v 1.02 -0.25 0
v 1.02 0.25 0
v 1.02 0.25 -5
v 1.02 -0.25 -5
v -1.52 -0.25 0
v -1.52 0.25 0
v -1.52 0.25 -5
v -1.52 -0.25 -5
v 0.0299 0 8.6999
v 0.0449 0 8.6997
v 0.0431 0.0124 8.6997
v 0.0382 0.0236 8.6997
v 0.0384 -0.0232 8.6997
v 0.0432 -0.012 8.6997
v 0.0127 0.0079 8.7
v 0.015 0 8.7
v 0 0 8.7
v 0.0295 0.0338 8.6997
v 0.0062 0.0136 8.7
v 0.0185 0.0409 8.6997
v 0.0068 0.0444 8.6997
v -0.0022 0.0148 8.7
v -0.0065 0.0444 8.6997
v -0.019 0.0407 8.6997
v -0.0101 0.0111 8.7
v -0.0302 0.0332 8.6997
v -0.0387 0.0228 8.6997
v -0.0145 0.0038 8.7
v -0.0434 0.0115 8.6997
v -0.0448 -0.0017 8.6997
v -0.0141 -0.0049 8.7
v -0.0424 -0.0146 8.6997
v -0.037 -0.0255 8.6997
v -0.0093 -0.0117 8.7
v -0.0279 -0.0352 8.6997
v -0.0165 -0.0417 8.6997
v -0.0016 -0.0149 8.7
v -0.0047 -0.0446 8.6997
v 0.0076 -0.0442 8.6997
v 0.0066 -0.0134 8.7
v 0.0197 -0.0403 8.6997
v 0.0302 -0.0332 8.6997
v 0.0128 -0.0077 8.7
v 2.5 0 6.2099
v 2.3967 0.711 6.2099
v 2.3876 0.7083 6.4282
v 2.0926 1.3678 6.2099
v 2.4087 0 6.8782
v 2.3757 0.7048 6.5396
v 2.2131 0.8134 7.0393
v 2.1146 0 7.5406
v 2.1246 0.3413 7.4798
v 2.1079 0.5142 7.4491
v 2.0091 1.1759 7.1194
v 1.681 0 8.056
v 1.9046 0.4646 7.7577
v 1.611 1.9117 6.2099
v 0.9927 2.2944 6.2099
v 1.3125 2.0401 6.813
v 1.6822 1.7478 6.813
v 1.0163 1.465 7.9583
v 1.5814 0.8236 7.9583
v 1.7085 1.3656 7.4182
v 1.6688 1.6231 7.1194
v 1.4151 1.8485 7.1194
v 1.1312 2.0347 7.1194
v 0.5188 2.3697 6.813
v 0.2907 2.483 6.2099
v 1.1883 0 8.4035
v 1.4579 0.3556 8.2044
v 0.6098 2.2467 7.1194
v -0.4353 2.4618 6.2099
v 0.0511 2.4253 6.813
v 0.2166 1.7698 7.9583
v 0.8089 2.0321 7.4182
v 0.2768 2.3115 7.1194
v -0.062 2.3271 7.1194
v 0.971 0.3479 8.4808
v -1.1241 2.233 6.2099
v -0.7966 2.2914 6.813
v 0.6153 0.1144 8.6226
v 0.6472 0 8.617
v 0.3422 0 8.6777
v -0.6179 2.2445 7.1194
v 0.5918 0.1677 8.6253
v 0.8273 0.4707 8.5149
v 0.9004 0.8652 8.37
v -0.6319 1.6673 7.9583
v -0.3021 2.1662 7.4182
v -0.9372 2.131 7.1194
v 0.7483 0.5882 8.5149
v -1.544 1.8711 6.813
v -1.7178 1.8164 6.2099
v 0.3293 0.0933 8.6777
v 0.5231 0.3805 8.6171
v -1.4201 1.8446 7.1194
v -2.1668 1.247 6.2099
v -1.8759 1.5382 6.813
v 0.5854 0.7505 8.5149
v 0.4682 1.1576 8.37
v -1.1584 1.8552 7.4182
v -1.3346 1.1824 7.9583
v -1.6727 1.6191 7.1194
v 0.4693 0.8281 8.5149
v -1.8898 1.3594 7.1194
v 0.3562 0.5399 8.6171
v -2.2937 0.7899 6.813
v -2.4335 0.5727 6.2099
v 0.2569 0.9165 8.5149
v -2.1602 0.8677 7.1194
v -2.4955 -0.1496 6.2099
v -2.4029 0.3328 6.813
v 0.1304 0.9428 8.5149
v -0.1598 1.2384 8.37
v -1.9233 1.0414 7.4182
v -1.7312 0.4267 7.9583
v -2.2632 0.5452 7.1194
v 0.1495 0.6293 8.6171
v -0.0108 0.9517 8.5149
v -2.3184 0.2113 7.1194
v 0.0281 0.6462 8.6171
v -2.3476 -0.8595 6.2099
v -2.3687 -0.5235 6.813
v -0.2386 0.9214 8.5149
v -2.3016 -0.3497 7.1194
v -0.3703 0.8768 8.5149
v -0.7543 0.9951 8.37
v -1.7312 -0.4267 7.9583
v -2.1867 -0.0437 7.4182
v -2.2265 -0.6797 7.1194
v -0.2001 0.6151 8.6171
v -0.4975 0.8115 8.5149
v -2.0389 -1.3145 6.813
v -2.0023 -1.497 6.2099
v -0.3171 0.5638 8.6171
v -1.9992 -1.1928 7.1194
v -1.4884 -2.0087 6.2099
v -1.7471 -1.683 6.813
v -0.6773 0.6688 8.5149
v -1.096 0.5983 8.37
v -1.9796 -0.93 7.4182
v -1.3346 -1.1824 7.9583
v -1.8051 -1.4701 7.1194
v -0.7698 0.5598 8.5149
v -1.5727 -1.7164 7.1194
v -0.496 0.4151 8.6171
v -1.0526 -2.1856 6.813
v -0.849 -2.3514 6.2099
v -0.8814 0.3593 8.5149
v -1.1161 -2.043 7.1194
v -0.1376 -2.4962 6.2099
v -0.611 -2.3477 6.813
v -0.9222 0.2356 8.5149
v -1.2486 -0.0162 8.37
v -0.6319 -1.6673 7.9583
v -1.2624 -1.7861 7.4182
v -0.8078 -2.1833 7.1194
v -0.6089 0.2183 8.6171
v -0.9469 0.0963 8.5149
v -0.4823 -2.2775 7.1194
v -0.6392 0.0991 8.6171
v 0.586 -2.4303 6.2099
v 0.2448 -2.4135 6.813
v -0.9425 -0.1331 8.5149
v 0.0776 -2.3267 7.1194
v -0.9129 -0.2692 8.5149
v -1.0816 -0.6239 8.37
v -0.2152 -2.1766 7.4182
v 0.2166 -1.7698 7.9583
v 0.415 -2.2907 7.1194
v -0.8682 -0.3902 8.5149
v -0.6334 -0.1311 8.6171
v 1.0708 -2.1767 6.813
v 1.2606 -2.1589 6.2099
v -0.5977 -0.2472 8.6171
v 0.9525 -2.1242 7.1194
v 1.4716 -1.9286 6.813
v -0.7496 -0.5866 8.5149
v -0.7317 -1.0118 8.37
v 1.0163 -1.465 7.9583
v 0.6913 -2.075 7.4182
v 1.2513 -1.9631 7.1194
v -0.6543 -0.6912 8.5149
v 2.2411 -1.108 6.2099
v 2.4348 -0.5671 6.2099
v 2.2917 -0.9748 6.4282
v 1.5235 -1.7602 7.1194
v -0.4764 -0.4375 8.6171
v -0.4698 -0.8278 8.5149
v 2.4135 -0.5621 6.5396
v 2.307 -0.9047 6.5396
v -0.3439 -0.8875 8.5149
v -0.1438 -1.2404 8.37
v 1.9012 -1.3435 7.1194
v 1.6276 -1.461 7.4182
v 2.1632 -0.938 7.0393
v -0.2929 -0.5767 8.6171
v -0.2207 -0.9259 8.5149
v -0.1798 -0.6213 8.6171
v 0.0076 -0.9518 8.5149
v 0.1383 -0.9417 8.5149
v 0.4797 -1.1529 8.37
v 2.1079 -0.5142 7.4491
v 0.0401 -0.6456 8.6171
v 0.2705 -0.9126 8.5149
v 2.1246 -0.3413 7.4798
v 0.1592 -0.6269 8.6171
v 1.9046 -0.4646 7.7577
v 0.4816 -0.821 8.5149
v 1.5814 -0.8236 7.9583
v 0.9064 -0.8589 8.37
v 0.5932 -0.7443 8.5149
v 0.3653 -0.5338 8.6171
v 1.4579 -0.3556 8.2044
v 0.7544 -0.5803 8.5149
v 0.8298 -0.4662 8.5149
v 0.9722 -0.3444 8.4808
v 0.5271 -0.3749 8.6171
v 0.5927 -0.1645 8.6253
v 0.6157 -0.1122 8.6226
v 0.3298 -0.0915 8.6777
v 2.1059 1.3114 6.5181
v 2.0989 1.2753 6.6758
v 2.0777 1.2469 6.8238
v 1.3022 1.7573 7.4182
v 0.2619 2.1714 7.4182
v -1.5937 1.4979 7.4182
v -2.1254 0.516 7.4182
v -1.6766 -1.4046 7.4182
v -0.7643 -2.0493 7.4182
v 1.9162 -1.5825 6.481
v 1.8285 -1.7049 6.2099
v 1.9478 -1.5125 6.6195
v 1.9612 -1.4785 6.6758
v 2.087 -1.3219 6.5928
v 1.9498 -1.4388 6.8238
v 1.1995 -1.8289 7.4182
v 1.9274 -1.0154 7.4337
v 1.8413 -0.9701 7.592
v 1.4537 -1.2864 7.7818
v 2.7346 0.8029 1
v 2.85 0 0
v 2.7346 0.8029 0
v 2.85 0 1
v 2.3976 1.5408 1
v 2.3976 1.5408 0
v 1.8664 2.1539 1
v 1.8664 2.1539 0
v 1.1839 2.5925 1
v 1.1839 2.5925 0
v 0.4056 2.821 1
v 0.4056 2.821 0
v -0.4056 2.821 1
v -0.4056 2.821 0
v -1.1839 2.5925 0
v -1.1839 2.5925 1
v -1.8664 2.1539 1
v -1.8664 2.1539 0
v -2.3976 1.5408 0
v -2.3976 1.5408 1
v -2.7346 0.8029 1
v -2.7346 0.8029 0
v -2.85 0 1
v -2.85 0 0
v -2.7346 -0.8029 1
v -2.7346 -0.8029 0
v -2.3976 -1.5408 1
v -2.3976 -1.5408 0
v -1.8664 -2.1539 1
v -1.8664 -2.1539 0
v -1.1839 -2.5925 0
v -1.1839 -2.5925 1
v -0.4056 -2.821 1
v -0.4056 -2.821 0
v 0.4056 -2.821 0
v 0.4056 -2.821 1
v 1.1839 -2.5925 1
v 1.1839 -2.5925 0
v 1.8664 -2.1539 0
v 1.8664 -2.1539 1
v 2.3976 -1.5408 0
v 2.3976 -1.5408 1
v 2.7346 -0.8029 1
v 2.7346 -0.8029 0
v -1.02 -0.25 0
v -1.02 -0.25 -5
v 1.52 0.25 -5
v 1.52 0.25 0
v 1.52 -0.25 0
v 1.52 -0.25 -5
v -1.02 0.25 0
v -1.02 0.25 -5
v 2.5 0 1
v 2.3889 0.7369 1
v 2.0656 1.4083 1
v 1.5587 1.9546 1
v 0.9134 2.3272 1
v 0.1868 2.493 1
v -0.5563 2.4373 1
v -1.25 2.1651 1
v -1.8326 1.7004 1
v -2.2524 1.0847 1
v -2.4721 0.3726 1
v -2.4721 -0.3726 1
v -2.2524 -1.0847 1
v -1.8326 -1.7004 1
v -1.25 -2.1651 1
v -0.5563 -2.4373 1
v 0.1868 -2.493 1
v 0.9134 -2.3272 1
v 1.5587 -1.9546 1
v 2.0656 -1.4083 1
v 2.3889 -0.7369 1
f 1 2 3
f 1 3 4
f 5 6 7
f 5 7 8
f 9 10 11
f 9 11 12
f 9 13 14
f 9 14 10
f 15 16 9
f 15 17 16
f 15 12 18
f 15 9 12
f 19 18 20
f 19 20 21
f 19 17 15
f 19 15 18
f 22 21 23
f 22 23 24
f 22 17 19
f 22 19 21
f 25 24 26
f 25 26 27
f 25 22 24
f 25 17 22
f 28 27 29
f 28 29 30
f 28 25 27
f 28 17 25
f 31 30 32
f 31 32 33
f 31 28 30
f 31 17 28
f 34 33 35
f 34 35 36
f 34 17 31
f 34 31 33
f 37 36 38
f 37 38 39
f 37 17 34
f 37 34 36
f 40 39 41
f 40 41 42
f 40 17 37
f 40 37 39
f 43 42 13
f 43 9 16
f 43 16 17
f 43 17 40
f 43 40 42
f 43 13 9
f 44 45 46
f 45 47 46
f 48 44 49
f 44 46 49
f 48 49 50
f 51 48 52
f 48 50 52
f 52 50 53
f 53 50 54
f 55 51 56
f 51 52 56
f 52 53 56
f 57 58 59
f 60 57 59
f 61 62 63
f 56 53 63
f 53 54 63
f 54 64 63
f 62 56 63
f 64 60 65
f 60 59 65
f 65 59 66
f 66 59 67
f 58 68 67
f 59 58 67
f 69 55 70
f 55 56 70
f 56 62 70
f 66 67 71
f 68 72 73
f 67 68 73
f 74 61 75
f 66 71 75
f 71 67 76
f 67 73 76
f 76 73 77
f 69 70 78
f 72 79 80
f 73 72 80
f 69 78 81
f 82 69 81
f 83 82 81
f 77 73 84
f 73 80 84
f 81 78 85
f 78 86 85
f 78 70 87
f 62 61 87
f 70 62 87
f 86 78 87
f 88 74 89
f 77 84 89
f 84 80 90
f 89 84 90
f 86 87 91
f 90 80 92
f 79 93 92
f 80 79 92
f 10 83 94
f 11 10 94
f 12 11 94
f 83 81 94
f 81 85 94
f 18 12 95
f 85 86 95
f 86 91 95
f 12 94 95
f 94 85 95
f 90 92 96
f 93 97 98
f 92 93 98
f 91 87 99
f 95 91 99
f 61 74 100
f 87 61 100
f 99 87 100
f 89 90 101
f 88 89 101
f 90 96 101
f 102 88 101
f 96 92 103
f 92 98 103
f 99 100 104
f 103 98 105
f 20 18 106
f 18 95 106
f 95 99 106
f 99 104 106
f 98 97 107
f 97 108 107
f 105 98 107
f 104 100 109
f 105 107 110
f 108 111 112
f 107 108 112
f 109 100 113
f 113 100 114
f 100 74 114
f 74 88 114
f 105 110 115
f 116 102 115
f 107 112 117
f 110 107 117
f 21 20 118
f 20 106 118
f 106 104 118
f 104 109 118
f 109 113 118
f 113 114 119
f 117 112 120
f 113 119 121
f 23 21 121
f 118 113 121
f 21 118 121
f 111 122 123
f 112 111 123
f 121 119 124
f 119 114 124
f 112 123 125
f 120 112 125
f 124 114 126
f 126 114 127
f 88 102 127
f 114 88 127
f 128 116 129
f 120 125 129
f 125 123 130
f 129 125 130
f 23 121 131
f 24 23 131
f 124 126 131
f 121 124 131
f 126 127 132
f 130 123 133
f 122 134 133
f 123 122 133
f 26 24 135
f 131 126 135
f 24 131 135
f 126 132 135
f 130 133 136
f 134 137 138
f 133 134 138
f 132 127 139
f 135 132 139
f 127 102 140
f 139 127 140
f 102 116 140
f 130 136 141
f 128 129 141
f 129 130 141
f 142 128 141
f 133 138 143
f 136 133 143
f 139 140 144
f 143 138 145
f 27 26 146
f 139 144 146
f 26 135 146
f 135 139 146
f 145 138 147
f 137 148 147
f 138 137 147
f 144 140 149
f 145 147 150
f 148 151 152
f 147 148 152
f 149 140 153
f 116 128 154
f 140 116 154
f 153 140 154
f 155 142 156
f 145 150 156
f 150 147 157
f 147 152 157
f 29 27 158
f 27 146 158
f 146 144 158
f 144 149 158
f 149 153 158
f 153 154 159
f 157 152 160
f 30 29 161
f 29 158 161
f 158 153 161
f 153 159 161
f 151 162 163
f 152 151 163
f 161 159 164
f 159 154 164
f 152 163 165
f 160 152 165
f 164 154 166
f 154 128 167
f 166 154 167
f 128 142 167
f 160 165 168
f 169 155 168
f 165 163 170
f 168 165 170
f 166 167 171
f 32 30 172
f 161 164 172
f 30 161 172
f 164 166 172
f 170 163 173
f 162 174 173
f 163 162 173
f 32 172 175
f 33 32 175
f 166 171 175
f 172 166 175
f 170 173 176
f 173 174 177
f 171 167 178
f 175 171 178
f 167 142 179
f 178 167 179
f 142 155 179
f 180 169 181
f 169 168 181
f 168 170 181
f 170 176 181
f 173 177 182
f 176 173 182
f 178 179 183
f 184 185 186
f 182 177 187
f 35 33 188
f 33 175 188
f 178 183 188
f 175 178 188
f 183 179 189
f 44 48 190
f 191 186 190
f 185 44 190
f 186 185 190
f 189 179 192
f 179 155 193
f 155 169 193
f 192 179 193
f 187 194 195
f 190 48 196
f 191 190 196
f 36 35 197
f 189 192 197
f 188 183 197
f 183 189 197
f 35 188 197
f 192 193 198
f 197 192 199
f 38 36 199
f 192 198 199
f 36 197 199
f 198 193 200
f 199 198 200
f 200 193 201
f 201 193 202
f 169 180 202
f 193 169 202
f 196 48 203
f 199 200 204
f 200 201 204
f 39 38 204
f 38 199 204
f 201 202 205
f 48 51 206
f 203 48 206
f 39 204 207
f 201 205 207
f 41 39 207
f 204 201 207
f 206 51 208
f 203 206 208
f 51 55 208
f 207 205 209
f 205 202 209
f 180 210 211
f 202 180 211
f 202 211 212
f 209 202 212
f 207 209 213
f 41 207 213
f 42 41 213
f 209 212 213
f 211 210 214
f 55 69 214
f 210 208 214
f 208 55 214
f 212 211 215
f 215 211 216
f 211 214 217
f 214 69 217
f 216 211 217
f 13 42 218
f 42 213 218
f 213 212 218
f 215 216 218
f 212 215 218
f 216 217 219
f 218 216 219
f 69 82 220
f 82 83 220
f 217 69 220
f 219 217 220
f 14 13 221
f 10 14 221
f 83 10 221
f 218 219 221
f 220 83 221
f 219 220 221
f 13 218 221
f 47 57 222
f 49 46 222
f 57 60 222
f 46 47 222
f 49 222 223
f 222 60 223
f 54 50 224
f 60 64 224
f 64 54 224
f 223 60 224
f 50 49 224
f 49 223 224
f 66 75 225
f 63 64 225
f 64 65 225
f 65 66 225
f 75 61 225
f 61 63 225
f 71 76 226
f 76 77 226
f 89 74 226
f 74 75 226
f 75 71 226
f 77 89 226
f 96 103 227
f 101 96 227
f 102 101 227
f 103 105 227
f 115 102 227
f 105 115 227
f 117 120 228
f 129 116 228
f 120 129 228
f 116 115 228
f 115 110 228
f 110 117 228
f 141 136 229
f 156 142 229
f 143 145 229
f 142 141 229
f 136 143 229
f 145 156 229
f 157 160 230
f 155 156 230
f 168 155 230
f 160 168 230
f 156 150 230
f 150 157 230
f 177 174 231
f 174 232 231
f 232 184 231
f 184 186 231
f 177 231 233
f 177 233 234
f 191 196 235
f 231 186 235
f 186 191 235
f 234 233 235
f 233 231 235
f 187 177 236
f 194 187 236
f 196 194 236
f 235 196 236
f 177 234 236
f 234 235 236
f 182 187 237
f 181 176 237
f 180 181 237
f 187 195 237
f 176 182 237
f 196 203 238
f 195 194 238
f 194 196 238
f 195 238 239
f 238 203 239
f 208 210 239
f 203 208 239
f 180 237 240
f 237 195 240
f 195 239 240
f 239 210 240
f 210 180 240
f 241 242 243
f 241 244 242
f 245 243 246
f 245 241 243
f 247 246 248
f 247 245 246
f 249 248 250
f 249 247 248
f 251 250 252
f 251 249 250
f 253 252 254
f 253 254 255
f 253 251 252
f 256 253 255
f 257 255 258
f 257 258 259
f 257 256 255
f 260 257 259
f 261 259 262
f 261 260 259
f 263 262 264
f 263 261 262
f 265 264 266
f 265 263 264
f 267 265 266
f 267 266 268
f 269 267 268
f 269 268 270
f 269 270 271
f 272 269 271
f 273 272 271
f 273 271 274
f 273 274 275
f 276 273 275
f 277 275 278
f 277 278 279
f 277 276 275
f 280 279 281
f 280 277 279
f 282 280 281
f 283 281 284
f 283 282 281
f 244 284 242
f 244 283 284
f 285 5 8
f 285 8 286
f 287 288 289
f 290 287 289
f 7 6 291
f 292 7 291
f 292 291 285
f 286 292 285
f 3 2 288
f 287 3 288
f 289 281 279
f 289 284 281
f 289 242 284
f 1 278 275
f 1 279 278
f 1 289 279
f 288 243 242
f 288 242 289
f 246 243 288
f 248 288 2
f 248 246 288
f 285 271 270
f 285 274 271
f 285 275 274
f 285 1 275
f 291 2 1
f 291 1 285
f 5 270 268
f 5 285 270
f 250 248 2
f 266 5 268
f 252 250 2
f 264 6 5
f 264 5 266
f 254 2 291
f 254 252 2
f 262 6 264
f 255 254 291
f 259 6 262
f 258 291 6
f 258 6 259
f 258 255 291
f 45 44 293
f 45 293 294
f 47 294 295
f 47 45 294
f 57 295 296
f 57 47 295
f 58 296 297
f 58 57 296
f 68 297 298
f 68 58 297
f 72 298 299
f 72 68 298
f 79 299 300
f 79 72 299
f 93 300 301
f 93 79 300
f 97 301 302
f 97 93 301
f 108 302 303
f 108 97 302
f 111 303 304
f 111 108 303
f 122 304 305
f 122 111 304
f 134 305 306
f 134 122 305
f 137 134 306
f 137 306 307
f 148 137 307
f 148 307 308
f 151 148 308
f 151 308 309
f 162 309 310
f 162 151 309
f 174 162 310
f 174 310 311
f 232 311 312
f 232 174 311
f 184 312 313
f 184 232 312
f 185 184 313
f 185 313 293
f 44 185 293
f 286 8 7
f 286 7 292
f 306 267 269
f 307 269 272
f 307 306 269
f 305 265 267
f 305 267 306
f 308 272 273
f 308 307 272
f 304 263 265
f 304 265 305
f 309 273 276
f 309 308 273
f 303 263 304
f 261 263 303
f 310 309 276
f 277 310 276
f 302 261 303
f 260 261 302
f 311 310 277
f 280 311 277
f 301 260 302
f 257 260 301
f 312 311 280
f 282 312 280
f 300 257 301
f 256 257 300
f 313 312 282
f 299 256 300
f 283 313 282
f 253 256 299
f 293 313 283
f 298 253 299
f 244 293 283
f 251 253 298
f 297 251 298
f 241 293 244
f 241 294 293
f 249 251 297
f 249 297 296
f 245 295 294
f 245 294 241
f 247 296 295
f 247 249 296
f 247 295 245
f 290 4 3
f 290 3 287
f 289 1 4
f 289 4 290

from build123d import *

# Parameters (mm, degrees)
SKETCH001_W = 0.5
SKETCH001_H = 0.5
PAD_DEPTH   = 5
FILLET_R    = 2.49


with BuildPart() as part:
    # Sketch → Revolution (revolve)
    with BuildSketch(Plane.XZ):
        with BuildLine():
            Line((0, 0), (2.85, 0))
            Line((2.85, 0), (2.85, 1))
            Line((2.85, 1), (2.5, 1))
            Line((2.5, 1), (2.5, 7.5))
            ThreePointArc((2.5, 7.5), (1.386542, 8.384463), (0, 8.7))
            Line((0, 0), (0, 8.7))
        make_face()
    revolve(axis=Axis((0, 0, 0), (0, 0, 1)))

    # Sketch001 (on Face1 of Revolution) → Pad (new body)
    with BuildSketch(Plane(origin=(0, 0, 0), x_dir=(1, 0, 0), z_dir=(0, 0, -1))):
        with Locations((1.27, 0)):
            Rectangle(SKETCH001_W, SKETCH001_H)
        with Locations((-1.27, 0)):
            Rectangle(SKETCH001_W, SKETCH001_H)
    extrude(amount=PAD_DEPTH)

    # Fillet
    fillet_edges = [part.edges().sort_by_distance(p)[0] for p in [
        (-2.5, 0, 7.5),
    ]]
    fillet(fillet_edges, radius=FILLET_R)


solid = part.part
